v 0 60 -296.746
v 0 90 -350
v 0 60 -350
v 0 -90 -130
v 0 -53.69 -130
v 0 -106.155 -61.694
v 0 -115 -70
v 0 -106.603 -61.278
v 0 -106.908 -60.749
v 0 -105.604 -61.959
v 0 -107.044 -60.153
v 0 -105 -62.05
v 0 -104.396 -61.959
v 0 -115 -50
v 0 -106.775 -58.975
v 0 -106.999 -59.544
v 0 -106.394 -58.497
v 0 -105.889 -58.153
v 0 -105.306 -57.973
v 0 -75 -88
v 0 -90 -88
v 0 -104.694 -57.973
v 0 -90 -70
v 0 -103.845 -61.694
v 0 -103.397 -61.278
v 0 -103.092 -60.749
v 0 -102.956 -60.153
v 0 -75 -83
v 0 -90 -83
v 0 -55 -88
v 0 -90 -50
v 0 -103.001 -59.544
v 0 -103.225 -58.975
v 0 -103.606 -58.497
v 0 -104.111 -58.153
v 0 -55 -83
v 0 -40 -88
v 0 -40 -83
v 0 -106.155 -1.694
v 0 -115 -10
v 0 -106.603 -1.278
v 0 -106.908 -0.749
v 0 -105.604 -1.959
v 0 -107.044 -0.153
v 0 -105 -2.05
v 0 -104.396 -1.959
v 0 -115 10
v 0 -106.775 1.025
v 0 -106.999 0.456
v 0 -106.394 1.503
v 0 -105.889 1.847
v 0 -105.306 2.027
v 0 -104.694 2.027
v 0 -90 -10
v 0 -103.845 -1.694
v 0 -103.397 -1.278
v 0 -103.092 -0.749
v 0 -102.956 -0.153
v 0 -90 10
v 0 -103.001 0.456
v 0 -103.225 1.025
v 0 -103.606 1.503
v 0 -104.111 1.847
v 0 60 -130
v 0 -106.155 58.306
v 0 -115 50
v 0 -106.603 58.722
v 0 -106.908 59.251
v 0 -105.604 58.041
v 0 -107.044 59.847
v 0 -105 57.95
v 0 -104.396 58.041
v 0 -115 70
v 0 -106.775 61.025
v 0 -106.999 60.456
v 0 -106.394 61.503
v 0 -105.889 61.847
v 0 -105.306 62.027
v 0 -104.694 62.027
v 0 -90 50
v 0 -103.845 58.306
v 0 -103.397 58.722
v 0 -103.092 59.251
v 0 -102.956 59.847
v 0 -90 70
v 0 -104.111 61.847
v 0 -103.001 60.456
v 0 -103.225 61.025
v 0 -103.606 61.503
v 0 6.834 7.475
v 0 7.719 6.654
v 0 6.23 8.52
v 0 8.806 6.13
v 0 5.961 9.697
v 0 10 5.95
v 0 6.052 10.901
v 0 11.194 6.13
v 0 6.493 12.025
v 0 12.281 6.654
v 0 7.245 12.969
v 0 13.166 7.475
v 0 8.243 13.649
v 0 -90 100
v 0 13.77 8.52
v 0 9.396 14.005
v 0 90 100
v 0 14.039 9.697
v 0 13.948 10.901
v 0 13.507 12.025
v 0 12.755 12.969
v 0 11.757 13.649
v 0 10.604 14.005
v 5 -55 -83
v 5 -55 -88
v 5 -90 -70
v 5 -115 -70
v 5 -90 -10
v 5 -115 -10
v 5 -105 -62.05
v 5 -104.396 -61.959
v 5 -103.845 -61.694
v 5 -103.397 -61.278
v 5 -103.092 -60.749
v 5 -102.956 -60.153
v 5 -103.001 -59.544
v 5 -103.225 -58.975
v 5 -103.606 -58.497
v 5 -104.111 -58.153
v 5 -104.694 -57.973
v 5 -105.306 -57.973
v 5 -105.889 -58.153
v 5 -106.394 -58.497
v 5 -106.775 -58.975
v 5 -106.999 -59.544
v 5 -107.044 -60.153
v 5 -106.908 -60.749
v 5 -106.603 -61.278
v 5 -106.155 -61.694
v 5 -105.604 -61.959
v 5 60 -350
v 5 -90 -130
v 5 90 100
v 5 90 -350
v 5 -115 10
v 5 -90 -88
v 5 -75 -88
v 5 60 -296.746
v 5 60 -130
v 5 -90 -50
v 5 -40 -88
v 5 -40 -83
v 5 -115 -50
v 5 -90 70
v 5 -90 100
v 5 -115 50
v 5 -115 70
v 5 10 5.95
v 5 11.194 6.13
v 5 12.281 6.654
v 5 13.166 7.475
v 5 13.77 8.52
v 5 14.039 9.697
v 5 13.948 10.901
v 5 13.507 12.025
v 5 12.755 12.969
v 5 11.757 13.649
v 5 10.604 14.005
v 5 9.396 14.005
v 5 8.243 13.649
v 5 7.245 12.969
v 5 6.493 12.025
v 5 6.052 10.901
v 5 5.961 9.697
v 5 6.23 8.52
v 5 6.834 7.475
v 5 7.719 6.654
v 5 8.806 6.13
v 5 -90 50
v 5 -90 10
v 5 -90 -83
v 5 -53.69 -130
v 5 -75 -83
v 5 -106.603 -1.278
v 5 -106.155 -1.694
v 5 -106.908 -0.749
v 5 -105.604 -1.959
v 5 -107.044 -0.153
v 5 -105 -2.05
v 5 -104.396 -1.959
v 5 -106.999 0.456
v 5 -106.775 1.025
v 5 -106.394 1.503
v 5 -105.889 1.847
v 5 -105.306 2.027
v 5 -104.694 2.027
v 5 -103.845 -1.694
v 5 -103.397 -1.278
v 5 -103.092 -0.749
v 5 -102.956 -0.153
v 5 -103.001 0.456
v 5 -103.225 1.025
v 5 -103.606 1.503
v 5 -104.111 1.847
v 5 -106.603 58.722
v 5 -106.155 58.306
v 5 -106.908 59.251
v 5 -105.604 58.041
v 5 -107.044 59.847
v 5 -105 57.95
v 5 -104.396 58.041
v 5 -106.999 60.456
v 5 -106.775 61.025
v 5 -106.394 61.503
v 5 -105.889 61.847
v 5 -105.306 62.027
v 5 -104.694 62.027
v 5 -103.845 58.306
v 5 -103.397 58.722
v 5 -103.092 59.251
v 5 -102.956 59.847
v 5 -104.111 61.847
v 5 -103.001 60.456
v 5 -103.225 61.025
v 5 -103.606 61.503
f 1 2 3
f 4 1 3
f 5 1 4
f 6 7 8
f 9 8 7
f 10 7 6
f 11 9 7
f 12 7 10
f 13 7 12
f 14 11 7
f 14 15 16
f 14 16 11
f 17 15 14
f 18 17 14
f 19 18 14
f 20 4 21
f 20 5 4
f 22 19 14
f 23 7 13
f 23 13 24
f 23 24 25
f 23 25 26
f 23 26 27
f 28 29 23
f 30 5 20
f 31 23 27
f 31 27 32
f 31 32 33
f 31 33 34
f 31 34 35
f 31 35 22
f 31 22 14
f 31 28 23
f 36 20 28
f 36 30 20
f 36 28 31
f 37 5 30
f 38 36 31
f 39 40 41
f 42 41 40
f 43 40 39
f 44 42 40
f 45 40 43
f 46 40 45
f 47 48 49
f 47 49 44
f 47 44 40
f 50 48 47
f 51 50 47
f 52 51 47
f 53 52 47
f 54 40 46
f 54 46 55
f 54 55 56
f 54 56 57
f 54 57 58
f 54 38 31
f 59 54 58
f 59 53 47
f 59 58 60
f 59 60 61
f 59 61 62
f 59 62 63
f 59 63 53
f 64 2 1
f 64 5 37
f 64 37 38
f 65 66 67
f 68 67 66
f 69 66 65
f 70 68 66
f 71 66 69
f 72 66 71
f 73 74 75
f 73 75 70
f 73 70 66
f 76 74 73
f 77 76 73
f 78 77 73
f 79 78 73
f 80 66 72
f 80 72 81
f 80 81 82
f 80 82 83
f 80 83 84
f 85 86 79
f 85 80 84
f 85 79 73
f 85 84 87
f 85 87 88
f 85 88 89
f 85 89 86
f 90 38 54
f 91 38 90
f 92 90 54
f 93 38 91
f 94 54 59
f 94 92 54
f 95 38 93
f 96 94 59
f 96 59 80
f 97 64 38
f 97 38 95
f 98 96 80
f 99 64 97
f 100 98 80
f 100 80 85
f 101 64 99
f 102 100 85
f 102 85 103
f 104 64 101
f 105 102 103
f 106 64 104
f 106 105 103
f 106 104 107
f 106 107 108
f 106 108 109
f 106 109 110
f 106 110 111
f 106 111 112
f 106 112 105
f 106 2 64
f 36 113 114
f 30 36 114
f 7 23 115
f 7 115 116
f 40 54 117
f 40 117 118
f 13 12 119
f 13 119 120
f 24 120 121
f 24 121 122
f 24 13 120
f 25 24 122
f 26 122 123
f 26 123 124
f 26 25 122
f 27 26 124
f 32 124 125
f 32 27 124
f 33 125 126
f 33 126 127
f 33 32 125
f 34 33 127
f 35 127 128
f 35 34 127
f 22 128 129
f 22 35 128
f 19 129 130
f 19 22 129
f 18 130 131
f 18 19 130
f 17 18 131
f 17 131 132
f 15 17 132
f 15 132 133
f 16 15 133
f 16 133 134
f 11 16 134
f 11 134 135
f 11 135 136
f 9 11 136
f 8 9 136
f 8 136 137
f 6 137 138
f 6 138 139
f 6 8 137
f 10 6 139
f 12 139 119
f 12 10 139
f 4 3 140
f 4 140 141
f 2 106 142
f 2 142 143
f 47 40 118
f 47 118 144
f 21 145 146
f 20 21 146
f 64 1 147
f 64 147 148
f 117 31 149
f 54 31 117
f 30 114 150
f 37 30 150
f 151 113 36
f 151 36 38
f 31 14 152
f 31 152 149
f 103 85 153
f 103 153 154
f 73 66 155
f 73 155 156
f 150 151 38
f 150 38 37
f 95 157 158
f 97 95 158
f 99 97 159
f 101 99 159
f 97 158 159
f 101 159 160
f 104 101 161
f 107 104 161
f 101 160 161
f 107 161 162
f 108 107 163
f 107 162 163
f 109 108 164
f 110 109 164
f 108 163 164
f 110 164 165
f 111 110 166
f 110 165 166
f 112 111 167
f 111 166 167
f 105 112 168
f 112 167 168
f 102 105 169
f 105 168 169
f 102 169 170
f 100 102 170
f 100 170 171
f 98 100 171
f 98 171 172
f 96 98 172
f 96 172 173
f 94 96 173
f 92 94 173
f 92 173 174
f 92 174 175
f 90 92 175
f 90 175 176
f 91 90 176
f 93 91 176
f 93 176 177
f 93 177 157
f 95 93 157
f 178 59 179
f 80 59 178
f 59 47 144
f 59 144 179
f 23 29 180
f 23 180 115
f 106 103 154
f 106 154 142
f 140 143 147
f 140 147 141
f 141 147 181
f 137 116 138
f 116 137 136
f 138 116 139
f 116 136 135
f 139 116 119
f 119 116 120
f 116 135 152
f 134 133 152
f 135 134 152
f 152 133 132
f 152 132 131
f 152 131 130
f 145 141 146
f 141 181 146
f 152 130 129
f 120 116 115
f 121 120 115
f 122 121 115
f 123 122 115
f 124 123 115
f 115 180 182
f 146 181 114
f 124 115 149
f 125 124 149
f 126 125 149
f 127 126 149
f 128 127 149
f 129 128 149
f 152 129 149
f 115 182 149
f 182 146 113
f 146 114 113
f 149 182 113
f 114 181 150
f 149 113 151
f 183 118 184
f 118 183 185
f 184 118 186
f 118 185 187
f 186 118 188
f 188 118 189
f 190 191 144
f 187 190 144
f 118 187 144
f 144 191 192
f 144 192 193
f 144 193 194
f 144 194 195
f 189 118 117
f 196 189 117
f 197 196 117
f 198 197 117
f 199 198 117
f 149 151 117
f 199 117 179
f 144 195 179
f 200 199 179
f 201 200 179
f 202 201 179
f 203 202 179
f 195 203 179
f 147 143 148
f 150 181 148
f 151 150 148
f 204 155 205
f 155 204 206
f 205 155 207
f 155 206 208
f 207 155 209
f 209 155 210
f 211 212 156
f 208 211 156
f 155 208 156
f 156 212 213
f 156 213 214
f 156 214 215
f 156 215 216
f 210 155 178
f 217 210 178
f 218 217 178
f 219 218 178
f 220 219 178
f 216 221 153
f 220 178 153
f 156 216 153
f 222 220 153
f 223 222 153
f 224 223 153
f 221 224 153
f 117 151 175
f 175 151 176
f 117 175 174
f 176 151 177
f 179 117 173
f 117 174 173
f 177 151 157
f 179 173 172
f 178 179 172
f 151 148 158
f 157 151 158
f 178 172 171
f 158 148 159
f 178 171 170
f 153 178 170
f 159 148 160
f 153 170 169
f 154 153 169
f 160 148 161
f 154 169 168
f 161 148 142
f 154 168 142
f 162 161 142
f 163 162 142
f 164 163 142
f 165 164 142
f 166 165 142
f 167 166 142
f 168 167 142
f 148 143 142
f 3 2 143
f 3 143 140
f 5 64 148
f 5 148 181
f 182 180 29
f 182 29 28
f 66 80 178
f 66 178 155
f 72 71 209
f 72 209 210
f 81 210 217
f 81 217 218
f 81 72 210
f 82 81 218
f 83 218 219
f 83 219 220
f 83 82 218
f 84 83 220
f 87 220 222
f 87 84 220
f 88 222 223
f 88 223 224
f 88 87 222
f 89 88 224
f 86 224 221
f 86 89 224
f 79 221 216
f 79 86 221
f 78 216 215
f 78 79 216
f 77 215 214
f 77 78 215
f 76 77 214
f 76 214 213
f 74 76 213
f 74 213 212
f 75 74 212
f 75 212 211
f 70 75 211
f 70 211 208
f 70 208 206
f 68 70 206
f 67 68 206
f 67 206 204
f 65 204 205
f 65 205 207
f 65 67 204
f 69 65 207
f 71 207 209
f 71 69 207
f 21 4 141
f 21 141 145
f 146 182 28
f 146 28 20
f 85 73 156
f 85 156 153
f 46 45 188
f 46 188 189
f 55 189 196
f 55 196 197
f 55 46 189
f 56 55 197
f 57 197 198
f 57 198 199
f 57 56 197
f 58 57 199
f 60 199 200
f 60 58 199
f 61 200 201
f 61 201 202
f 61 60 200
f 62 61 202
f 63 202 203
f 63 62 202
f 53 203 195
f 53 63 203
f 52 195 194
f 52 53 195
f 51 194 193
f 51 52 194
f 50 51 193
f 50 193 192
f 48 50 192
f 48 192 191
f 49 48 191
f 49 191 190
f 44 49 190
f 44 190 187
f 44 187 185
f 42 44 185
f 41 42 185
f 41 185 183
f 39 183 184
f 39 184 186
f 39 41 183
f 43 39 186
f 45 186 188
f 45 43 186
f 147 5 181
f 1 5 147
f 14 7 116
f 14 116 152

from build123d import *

# Parameters (mm, degrees)
SKETCH_1_R          = 2.05
EXTRUDE_1_DEPTH     = 5
SKETCH_2_R          = 4.05
CUT_EXTRUDE_1_DEPTH = 10
SKETCH_3_W          = 5
SKETCH_3_H          = 15
CUT_EXTRUDE_2_DEPTH = 153.47950682
EXTRUDE_2_DEPTH     = 5


with BuildPart() as part:
    # 草圖1 → 填料-伸長1 (new body)
    with BuildSketch(Plane(origin=(0, 0, 0), x_dir=(0, 0, -1), z_dir=(1, 0, 0))):
        Polygon((-70, -90), (-100, -90), (-100, 90), (100, 90), (100, -90), (70, -90), (70, -115), (50, -115), (50, -90), (10, -90), (10, -115), (-10, -115), (-10, -90), (-50, -90), (-50, -115), (-70, -115), align=None)
        with Locations((-60, -105)):
            Circle(SKETCH_1_R, mode=Mode.SUBTRACT)
        with Locations((0, -105)):
            Circle(SKETCH_1_R, mode=Mode.SUBTRACT)
        with Locations((60, -105)):
            Circle(SKETCH_1_R, mode=Mode.SUBTRACT)
    extrude(amount=EXTRUDE_1_DEPTH)

    # 草圖2 → 除料-伸長1 (cut)
    with BuildSketch(Plane(origin=(5, 0, 0), x_dir=(0, 0, -1), z_dir=(1, 0, 0))):
        with Locations((-10, 10)):
            Circle(SKETCH_2_R)
    extrude(amount=-CUT_EXTRUDE_1_DEPTH, mode=Mode.SUBTRACT)

    # 草圖3 → 除料-伸長2 (cut, through all)
    with BuildSketch(Plane(origin=(5, 0, 0), x_dir=(0, 0, -1), z_dir=(1, 0, 0))):
        with Locations((85.5, -47.5)):
            Rectangle(SKETCH_3_W, SKETCH_3_H)
        with Locations((85.5, -82.5)):
            Rectangle(SKETCH_3_W, SKETCH_3_H)
    extrude(amount=-CUT_EXTRUDE_2_DEPTH, mode=Mode.SUBTRACT)

    # 草圖4 → 填料-伸長2 (add)
    with BuildSketch(Plane.ZY):
        Polygon((-100, 90), (-350, 90), (-350, 60), (-130, -90), (-100, -90), align=None)
        Polygon((-130, 60), (-130, -53.69038103), (-296.745892177, 60), align=None, mode=Mode.SUBTRACT)
    extrude(amount=-EXTRUDE_2_DEPTH)


solid = part.part
